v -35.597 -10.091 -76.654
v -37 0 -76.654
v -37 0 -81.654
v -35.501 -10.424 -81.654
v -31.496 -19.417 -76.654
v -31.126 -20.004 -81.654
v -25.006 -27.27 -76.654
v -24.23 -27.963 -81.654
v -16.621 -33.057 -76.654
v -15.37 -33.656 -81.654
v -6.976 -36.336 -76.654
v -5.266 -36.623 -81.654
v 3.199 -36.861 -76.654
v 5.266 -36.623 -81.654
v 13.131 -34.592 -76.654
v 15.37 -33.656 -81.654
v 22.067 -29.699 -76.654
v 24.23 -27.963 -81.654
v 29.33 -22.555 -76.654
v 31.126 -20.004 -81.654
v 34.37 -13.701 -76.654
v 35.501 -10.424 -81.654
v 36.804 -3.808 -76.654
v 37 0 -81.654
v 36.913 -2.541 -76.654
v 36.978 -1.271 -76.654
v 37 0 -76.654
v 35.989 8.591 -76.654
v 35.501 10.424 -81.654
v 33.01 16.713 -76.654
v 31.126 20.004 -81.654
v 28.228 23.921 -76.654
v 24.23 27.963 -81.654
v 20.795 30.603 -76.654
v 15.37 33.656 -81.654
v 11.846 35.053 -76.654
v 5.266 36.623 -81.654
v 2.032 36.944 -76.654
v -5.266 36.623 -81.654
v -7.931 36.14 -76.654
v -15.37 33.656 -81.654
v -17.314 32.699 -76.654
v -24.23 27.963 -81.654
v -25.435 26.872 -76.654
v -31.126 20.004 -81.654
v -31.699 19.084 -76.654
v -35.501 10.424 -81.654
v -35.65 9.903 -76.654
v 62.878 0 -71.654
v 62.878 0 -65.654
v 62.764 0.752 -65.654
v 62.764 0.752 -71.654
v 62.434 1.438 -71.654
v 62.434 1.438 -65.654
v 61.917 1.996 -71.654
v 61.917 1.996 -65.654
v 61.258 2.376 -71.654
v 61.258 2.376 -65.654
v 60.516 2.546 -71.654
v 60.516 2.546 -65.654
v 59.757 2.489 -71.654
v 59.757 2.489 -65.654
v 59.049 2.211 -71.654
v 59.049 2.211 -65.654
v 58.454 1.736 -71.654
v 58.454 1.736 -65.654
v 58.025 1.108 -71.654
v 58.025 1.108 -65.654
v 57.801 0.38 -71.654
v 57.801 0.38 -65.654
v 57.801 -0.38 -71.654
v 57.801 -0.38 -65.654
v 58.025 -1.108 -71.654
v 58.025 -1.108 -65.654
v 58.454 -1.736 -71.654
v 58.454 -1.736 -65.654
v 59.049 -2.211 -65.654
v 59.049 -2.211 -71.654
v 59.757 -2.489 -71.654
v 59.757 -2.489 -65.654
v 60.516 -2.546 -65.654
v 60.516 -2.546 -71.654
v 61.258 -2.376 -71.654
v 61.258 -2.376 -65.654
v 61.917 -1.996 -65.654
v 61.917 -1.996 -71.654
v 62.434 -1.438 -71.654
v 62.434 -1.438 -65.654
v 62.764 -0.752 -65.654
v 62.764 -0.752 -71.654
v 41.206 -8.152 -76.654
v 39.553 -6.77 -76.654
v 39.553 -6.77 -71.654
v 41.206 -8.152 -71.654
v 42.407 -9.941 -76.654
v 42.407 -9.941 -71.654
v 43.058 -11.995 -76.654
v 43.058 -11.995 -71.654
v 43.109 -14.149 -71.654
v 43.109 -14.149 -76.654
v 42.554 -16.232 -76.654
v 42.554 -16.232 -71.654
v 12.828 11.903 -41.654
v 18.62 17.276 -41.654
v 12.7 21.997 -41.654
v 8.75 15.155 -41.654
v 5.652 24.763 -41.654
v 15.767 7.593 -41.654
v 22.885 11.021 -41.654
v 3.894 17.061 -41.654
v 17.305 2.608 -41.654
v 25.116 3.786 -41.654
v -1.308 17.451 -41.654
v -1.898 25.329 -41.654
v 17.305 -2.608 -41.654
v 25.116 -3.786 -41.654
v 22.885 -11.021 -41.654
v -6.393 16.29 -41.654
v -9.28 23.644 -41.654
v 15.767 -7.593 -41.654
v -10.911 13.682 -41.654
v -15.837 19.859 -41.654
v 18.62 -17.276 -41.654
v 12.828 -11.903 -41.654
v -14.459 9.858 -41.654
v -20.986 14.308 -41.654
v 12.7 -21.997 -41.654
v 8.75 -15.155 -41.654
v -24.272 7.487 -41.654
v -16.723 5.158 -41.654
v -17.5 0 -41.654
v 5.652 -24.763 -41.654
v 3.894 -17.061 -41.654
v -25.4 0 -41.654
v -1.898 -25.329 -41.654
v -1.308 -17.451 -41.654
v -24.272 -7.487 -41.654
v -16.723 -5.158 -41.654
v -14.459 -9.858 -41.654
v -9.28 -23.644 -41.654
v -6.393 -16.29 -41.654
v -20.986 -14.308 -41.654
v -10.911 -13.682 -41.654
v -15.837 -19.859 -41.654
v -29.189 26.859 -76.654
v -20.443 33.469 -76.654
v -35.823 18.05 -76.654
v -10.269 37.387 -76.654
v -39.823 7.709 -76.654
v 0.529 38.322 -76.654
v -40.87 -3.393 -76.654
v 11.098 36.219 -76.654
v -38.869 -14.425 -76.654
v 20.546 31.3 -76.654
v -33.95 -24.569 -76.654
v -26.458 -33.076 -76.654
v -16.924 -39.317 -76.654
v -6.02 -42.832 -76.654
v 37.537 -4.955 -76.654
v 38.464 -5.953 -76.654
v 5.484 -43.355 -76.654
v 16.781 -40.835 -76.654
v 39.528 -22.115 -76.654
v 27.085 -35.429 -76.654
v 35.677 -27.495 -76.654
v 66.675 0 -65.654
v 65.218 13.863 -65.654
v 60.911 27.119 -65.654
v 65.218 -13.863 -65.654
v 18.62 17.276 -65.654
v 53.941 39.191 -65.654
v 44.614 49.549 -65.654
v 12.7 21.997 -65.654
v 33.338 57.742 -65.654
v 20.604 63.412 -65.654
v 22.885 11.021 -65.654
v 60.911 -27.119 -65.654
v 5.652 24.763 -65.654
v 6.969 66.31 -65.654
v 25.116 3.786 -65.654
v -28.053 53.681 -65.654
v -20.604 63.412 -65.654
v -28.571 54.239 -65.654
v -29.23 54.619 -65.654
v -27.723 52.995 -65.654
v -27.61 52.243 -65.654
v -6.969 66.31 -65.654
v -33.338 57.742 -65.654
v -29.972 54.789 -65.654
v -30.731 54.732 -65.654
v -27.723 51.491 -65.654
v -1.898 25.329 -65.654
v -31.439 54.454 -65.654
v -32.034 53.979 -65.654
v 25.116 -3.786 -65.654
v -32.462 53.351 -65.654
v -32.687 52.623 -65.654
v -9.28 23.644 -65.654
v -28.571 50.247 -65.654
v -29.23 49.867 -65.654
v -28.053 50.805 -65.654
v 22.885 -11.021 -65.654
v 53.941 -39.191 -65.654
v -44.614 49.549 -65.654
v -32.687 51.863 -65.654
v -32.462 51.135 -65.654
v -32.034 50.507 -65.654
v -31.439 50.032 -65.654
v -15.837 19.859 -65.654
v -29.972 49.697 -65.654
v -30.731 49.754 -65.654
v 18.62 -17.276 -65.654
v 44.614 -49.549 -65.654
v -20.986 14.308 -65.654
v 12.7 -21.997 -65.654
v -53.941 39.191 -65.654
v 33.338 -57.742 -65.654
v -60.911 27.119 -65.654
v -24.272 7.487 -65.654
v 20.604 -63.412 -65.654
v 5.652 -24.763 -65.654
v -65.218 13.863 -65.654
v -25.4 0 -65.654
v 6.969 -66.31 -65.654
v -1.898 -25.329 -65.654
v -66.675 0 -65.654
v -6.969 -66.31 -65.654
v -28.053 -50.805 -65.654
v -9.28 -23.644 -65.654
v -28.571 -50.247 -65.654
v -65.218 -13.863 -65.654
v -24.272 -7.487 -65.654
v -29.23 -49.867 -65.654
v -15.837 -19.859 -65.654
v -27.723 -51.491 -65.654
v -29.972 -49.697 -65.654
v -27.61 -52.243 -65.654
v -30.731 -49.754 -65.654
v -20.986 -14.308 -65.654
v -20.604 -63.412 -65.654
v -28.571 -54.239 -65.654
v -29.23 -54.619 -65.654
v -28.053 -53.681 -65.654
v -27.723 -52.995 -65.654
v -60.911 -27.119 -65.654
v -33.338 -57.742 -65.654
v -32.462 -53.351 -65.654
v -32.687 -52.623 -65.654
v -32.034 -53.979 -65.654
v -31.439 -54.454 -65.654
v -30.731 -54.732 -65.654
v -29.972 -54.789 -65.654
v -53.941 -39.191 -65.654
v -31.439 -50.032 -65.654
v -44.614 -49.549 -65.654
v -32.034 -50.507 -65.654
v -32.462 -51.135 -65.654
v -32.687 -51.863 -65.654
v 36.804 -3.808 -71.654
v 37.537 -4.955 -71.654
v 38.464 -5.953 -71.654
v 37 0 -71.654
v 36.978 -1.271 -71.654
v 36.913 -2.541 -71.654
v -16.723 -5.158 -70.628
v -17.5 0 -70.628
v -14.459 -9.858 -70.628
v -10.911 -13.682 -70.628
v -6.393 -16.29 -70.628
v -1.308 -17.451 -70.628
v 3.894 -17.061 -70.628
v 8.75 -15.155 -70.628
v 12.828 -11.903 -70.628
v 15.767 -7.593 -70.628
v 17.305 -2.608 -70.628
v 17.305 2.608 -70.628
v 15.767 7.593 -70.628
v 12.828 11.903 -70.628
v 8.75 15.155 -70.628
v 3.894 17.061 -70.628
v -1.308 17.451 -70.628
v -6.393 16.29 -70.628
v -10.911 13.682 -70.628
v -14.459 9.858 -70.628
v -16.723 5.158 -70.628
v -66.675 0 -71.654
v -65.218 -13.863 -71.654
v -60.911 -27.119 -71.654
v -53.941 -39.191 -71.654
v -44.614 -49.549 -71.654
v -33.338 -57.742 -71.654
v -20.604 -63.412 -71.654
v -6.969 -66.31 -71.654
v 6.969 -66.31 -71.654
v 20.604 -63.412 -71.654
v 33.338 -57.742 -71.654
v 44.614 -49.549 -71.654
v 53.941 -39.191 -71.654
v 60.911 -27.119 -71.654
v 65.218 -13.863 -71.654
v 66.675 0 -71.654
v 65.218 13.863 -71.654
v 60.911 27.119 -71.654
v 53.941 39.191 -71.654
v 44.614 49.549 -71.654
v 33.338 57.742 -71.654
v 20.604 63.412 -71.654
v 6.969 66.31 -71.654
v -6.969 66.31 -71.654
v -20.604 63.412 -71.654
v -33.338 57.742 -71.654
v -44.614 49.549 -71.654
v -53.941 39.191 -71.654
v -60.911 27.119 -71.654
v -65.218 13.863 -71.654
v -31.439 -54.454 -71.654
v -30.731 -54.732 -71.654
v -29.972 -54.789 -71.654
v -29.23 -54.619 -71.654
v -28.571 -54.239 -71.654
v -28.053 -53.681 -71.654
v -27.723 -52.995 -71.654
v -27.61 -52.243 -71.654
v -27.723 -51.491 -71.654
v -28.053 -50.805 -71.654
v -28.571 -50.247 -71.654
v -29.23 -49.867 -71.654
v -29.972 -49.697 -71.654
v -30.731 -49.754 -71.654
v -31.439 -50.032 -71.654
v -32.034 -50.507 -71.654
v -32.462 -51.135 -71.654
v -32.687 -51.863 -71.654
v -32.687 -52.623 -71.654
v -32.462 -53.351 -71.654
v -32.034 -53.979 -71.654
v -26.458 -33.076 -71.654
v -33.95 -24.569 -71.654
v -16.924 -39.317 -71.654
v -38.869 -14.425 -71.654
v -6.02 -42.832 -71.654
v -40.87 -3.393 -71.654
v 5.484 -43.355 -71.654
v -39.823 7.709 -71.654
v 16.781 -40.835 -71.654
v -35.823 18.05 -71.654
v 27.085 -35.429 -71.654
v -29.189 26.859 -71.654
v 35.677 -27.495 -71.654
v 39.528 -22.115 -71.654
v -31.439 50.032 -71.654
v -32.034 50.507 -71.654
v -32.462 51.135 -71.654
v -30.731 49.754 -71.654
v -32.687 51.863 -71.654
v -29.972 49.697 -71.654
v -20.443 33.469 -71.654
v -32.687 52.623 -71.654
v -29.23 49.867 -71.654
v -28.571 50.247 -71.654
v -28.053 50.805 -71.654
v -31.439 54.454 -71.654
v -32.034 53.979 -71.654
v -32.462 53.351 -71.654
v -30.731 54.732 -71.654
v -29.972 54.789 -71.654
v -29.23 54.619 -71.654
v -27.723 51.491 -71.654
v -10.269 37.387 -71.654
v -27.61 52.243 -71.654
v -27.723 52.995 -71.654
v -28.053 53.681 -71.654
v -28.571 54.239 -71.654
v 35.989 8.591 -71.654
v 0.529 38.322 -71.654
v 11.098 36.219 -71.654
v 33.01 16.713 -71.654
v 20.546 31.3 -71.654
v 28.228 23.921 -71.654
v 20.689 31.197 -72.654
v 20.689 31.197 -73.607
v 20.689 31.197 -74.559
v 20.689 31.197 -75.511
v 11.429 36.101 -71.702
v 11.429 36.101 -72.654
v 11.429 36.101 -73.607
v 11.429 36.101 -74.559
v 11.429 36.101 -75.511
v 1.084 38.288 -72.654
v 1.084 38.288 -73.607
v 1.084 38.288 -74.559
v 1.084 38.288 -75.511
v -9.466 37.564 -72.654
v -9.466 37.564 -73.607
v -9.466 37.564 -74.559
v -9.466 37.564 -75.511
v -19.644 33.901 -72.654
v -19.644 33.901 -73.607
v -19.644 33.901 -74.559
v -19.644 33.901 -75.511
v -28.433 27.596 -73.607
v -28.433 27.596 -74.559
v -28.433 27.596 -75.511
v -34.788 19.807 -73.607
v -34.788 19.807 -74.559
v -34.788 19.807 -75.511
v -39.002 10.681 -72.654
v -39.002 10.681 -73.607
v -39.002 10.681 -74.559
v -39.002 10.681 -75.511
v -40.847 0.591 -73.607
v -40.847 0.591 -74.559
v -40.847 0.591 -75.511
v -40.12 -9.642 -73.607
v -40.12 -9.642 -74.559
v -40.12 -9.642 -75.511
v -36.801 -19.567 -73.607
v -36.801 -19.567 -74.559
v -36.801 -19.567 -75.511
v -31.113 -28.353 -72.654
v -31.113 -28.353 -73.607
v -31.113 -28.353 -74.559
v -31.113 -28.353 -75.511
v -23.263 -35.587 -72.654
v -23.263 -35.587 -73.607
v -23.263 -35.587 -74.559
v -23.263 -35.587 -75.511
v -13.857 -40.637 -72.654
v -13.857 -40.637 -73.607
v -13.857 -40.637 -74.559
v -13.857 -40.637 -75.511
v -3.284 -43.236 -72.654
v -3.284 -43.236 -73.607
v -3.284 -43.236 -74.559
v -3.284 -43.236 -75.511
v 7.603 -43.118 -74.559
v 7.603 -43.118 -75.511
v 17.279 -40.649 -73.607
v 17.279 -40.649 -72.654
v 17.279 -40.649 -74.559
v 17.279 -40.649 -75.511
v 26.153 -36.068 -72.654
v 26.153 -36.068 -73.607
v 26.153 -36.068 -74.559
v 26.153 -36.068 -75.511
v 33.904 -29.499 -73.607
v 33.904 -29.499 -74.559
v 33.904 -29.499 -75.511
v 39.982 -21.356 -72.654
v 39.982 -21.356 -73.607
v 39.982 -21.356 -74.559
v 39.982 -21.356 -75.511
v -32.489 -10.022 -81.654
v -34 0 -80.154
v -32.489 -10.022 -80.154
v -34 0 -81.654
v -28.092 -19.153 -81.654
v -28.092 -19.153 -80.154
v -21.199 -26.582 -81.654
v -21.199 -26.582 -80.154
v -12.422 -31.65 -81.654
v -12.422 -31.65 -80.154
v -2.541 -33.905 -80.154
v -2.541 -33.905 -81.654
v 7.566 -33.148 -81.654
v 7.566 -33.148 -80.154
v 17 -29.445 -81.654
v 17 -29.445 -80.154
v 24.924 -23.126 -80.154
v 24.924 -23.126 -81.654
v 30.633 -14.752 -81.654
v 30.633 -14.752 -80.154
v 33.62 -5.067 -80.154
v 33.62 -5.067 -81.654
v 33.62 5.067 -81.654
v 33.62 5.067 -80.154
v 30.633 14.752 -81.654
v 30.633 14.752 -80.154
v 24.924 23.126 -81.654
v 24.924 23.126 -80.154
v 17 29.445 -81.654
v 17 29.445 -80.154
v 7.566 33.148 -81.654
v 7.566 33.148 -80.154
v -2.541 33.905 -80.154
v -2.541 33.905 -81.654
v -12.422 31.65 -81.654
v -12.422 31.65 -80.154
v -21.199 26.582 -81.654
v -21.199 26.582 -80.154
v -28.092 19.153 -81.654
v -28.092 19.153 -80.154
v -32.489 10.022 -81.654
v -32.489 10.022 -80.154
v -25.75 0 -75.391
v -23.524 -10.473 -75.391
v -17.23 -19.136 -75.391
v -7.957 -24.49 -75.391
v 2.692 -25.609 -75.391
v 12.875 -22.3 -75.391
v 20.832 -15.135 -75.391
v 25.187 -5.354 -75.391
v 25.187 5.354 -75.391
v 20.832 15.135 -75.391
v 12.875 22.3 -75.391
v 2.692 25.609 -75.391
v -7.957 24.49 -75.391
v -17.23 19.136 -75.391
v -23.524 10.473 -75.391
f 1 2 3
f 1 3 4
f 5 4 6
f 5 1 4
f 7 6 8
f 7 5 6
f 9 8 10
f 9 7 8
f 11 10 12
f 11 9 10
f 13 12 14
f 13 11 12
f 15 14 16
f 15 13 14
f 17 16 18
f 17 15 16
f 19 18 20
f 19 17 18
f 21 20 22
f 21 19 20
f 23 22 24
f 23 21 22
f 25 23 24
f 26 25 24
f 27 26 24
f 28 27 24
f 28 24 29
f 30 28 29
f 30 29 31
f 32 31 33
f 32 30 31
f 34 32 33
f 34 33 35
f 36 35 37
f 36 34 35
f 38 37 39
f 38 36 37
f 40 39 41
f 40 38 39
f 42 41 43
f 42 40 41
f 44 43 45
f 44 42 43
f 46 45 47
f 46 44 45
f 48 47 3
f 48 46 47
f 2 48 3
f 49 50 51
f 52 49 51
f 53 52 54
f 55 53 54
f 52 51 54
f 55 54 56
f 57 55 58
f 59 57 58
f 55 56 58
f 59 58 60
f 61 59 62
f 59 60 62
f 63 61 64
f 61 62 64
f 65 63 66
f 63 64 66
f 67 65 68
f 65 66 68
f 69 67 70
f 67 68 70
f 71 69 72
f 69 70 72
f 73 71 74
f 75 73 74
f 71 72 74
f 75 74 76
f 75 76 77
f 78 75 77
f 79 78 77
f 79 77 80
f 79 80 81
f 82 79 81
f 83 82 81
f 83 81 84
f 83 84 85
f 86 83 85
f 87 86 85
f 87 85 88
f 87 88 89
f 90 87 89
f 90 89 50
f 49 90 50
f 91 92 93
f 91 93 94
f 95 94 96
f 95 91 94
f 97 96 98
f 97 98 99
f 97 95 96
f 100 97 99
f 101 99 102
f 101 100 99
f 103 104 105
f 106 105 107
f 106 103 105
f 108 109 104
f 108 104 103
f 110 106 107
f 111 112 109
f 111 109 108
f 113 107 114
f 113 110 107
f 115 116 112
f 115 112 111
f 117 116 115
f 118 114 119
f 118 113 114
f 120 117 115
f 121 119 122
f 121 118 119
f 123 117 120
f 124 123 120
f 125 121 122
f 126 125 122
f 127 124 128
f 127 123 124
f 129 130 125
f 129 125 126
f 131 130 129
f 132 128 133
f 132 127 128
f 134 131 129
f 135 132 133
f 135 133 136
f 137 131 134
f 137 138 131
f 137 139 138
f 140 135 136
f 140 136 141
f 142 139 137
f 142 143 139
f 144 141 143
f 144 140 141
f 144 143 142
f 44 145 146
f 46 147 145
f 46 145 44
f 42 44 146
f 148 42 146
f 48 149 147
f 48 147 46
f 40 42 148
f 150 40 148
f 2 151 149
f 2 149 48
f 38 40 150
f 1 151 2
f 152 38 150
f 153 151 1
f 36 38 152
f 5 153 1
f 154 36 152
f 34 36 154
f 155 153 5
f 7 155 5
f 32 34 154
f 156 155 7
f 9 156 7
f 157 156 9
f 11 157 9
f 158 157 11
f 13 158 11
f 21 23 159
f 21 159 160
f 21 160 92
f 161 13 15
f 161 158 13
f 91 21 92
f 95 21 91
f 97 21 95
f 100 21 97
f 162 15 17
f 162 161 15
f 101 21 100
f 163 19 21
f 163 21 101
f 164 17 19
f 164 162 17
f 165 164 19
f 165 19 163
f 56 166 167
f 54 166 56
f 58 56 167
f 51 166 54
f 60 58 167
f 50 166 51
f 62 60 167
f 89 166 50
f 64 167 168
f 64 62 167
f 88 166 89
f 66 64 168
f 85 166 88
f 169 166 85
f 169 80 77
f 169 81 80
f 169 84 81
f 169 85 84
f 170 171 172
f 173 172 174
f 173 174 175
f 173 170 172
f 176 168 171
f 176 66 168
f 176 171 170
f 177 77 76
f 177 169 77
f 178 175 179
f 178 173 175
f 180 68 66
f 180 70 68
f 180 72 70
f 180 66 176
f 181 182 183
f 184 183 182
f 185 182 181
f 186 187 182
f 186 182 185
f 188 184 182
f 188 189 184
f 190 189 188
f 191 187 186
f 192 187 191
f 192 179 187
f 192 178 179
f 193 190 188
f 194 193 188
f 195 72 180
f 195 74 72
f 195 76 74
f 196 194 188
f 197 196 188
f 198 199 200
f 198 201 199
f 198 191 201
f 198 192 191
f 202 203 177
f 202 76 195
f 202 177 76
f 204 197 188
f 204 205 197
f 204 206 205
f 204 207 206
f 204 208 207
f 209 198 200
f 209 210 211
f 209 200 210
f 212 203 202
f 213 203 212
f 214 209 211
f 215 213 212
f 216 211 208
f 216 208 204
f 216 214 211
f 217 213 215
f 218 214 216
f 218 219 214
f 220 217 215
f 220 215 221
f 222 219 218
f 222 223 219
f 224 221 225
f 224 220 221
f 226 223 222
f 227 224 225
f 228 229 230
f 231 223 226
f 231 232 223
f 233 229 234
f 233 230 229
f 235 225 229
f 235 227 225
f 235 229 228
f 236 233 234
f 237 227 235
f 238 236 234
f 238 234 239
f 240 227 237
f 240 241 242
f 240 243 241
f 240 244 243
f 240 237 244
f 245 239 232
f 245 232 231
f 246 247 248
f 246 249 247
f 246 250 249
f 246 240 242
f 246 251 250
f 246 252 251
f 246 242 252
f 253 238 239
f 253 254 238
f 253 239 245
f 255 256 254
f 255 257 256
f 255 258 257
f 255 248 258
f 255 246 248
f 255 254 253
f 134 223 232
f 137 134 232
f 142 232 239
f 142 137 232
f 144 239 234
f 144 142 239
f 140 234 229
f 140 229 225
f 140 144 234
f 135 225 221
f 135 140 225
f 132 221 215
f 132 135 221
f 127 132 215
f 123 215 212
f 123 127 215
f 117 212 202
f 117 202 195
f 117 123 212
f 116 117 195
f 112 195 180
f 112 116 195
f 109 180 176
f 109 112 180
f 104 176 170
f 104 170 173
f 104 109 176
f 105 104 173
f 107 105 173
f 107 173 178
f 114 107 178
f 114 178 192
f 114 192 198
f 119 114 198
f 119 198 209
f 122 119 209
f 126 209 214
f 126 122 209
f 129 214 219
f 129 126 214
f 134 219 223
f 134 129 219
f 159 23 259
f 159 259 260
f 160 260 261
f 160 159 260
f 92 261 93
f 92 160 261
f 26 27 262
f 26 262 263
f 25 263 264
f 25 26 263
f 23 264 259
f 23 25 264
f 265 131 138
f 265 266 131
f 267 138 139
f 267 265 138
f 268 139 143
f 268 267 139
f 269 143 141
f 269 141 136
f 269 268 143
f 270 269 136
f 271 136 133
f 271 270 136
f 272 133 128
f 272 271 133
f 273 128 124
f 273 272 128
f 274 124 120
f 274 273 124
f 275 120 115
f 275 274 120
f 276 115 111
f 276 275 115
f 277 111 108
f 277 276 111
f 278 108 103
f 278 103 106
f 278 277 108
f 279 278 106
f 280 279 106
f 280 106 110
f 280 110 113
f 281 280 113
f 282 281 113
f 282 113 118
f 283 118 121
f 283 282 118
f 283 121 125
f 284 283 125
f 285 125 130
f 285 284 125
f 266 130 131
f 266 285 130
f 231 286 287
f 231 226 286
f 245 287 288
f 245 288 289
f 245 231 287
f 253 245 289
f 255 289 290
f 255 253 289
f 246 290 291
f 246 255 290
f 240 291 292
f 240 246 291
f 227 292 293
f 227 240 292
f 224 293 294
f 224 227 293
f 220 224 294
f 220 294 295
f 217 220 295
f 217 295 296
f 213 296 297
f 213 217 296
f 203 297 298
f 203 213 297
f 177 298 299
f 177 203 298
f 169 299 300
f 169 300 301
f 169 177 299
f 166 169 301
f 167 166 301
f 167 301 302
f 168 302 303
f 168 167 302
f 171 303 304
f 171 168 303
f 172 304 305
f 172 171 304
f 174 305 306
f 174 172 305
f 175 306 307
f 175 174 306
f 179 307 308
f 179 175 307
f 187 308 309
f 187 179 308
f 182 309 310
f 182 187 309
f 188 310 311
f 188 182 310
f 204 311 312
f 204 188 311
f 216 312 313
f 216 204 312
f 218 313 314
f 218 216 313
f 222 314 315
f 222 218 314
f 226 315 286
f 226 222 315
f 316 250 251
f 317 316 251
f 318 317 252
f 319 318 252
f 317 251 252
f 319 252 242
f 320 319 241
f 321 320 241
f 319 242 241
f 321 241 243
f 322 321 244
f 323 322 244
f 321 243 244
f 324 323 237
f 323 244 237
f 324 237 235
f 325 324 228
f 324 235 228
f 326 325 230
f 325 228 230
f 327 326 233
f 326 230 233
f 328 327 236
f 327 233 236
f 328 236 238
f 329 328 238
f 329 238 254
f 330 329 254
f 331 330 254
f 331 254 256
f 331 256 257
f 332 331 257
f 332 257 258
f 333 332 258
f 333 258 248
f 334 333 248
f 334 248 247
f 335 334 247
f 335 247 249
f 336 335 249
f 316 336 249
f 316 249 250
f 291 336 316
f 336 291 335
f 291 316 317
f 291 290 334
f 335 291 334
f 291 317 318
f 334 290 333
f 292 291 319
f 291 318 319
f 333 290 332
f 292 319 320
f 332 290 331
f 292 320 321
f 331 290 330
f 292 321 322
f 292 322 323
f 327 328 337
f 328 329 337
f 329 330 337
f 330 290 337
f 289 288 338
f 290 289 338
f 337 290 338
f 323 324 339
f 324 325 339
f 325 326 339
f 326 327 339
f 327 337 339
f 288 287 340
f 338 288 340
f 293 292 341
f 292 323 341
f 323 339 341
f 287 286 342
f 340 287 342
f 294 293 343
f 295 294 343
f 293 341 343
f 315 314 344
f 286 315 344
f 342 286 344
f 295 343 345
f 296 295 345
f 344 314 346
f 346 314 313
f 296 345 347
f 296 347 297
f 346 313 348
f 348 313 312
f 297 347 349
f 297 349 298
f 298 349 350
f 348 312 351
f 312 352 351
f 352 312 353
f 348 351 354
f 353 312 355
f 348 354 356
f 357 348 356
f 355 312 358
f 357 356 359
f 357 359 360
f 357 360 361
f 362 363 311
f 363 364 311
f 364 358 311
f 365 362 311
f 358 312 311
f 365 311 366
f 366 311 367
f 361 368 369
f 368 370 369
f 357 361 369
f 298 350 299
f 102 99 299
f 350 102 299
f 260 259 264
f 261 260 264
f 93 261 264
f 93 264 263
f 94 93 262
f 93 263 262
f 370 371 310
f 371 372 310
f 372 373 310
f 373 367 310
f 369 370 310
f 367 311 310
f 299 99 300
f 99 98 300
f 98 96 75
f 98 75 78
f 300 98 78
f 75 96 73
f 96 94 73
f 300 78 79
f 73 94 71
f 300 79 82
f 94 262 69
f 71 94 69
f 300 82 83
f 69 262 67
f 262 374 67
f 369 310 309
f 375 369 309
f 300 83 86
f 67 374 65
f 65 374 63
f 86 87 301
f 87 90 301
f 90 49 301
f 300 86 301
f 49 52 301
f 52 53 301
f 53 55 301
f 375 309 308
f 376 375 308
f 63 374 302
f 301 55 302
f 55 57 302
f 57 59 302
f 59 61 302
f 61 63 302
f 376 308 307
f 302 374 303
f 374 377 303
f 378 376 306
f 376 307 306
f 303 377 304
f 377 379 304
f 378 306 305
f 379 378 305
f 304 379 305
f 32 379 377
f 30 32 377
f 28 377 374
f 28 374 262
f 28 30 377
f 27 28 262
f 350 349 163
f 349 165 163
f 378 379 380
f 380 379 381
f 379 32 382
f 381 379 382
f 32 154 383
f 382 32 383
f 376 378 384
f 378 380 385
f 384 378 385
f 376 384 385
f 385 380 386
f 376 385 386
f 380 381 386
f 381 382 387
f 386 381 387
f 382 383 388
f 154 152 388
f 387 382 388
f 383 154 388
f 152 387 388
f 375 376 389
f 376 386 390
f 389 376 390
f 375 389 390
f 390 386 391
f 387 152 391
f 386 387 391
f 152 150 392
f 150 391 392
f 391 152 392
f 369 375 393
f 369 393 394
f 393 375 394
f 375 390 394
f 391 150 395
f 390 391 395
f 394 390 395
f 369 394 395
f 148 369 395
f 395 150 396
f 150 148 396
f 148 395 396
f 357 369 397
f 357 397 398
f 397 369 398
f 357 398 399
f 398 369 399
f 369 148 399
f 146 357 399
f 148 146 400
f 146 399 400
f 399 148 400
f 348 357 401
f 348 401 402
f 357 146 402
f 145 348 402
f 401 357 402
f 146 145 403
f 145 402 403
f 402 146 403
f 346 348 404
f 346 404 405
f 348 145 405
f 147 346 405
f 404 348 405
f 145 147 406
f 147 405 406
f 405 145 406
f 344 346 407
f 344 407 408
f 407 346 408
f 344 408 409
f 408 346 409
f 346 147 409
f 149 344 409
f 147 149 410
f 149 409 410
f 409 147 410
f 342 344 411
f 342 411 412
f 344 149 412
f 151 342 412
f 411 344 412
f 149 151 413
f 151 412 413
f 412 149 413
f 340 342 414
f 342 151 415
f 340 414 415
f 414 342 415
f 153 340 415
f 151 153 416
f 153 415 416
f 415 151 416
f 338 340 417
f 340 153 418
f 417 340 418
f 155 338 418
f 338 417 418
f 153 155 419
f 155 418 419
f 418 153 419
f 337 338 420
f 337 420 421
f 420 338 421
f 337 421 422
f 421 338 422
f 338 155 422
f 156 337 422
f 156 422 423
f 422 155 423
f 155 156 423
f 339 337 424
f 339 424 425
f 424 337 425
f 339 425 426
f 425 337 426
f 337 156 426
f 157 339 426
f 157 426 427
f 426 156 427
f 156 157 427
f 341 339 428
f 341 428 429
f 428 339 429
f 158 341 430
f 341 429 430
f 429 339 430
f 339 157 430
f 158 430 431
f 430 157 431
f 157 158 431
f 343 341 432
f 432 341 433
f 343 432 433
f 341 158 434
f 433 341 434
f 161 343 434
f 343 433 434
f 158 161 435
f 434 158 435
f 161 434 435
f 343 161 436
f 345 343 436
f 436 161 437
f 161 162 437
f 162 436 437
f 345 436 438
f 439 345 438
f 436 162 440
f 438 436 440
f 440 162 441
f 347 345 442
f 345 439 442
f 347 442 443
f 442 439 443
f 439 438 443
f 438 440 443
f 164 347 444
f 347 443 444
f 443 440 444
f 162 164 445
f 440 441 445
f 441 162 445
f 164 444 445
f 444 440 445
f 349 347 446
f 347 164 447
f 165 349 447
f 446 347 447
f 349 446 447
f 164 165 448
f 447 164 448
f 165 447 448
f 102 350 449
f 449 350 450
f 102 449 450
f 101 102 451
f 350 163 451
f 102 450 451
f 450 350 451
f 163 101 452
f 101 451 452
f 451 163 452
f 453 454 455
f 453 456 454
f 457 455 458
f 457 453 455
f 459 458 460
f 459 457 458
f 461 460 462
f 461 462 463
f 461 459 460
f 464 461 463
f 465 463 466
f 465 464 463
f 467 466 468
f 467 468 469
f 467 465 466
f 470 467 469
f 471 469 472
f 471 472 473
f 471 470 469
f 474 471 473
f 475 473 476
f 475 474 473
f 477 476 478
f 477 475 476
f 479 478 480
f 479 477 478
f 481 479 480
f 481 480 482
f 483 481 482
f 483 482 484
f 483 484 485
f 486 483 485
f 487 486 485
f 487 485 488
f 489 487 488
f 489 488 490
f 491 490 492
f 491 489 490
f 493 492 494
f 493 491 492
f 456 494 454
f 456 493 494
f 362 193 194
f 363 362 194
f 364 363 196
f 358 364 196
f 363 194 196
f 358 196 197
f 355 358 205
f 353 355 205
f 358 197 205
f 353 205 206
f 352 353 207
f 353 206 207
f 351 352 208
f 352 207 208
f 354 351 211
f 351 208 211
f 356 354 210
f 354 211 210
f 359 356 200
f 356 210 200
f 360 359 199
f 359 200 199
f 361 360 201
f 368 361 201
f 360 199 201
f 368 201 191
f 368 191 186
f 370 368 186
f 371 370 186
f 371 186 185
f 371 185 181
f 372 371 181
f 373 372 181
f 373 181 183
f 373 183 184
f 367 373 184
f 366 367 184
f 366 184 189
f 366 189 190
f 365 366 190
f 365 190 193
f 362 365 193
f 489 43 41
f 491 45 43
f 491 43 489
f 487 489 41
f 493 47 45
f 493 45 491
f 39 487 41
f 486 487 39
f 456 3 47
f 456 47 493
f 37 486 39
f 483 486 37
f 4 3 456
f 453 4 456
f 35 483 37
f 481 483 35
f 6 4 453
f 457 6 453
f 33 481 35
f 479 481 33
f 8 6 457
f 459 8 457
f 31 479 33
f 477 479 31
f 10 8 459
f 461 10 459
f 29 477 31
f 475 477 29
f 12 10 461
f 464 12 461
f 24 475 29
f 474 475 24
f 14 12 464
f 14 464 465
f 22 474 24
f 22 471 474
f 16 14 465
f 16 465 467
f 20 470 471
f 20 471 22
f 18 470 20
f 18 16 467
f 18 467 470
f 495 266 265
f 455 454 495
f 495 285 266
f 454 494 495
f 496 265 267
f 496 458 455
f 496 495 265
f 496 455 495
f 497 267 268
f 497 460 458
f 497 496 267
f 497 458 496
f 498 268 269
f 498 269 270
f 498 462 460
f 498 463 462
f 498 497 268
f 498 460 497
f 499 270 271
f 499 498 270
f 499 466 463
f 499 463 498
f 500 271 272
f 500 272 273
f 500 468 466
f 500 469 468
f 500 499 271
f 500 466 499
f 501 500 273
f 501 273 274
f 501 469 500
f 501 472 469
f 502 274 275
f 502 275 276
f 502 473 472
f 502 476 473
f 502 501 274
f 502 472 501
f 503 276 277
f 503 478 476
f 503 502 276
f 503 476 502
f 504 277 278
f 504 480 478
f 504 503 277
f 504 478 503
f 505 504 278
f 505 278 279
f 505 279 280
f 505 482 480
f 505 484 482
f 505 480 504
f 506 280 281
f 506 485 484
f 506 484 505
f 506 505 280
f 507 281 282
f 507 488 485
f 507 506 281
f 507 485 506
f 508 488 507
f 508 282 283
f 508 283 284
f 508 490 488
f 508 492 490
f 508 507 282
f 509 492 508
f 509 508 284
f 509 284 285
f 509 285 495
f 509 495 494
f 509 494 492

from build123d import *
from build123d.topology import SkipClean

# Parameters (mm, degrees)
SKETCH18_R             = 47.625
CUT_EXTRUDE2_DEPTH     = 5
F_10_CLEARANCE_HOLE1_D = 5.1054
CIRPATTERN1_COUNT      = 3


with BuildPart() as part:
    # Sketch24 → Revolve1 (revolve)
    with BuildSketch(Plane(origin=(0, 0, 0), x_dir=(1, 0, 0), z_dir=(0, 1, 0))):
        Polygon((-37, 81.654237034), (-37, 76.654237034), (-47.625, 76.654237034), (-47.625, 71.654237034), (-66.675, 71.654237034), (-66.675, 65.654237034), (-25.4, 65.654237034), (-25.4, 41.654237034), (-17.5, 41.654237034), (-17.5, 70.627957592), (-34, 80.154237034), (-34, 81.654237034), align=None)
    revolve(axis=Axis((0, 0, -86.654237034), (0, 0, 1)))

    # Sketch18 → Cut-Extrude2 (cut)
    with SkipClean():  # the faces are left unmerged after this step: merging them gives an invalid solid
        with BuildSketch(Plane.XY.offset(-76.654237034)):
            Circle(SKETCH18_R)
            with BuildLine():
                ThreePointArc((36.803517411, -3.8080318), (37.978132396, -5.474504313), (39.552581276, -6.769865934))
                ThreePointArc((39.552581276, -6.769865934), (42.805320101, -10.94498561), (42.554027377, -16.231646763))
                add(Edge.make_bspline(
                    [(28.227591738, 23.920766389), (28.169074611, 23.995894132), (27.726201544, 24.559979405), (26.867938753, 25.590107465), (25.60001603, 26.964989265), (24.261773335, 28.277085961), (22.856314773, 29.522798851), (21.386929147, 30.698682629), (19.85708232, 31.801454876), (18.270409111, 32.828005175), (16.630704717, 33.775403815), (14.941915703, 34.640910073), (13.208130556, 35.421980041), (11.43356985, 36.116273987), (9.622576022, 36.721663214), (7.779602801, 37.236236415), (5.909204301, 37.658305492), (4.016023818, 37.986410831), (2.104782347, 38.219326014), (0.180266852, 38.356061949), (-1.75268168, 38.395870413), (-3.689180377, 38.338246992), (-5.624316777, 38.182933409), (-7.553161251, 37.929919231), (-9.470779522, 37.579442948), (-11.37224525, 37.131992419), (-13.252652651, 36.588304682), (-15.107129112, 35.949365124), (-16.930847778, 35.216406011), (-18.719040078, 34.390904381), (-20.467008144, 33.474579298), (-22.170137115, 32.469388481), (-23.823907266, 31.377524301), (-25.42390596, 30.201409162), (-26.965839357, 28.943690275), (-28.445543888, 27.607233836), (-29.858997424, 26.195118613), (-31.202330147, 24.710628968), (-32.471835063, 23.157247319), (-33.663978152, 21.538646066), (-34.775408104, 19.858679), (-35.802965645, 18.121372202), (-36.743692396, 16.330914471), (-37.594839261, 14.491647299), (-38.353874308, 12.608054401), (-39.018490139, 10.68475085), (-39.586610697, 8.726471825), (-40.056397525, 6.738061006), (-40.426255434, 4.724458642), (-40.694837576, 2.690689328), (-40.861049894, 0.641849508), (-40.924054953, -1.416905249), (-40.883275123, -3.480373184), (-40.738395114, -5.543319447), (-40.489363842, -7.600489337), (-40.13639564, -9.646621653), (-39.679970776, -11.676462103), (-39.120835312, -13.684776759), (-38.460000265, -15.666365517), (-37.698740094, -17.61607551), (-36.838590511, -19.528814477), (-35.881345602, -21.399564006), (-34.829054288, -23.223392663), (-33.684016107, -24.995468936), (-32.44877635, -26.711073982), (-31.126120537, -28.365614138), (-29.719068263, -29.954633155), (-28.230866416, -31.473824138), (-26.664981791, -32.919041144), (-25.025093105, -34.286310417), (-23.315082441, -35.571841228), (-21.53902614, -36.772036288), (-19.701185153, -37.883501708), (-17.805994889, -38.903056478), (-15.85805457, -39.827741435), (-13.862116128, -40.654827709), (-11.823072667, -41.381824596), (-9.745946518, -42.006486871), (-7.635876912, -42.526821485), (-5.498107312, -42.941093656), (-3.337972426, -43.247832311), (-1.160884928, -43.445834888), (1.027678058, -43.534171454), (3.222188708, -43.512188152), (5.417082419, -43.379509955), (7.606771886, -43.136042707), (9.785661288, -42.781974466), (11.948160555, -42.317776118), (14.08869967, -41.74420128), (16.201742982, -41.062285471), (18.281803484, -40.273344558), (20.323457017, -39.378972487), (22.321356376, -38.381038284), (24.27024527, -37.281682345), (26.164972102, -36.083312015), (28.000503535, -34.788596469), (29.77193781, -33.400460899), (31.474517775, -31.92208003), (33.103643596, -30.356870964), (34.654885111, -28.708485383), (36.123993806, -26.980801118), (37.506914359, -25.17791311), (38.799795742, -23.304123775), (39.999001844, -21.363932809), (41.101121576, -19.362026441), (41.938186302, -17.641904891), (42.402189205, -16.588613759), (42.554027377, -16.231646763)],
                    knots=[0.099688645, 0.099688645, 0.099688645, 0.099688645, 0.100798534, 0.108047194, 0.115310927, 0.122589766, 0.12988374, 0.13719288, 0.144517215, 0.151856774, 0.159211583, 0.16658167, 0.173967063, 0.181367786, 0.188783866, 0.196215328, 0.203662198, 0.211124498, 0.218602253, 0.226095488, 0.233604225, 0.241128486, 0.248668296, 0.256223676, 0.263794648, 0.271381234, 0.278983456, 0.286601335, 0.294234891, 0.301884146, 0.309549121, 0.317229835, 0.324926308, 0.332638561, 0.340366614, 0.348110485, 0.355870195, 0.363645762, 0.371437205, 0.379244543, 0.387067795, 0.39490698, 0.402762115, 0.410633219, 0.41852031, 0.426423405, 0.434342523, 0.442277682, 0.450228898, 0.458196189, 0.466179572, 0.474179065, 0.482194684, 0.490226447, 0.498274369, 0.506338468, 0.514418761, 0.522515263, 0.530627991, 0.538756962, 0.546902191, 0.555063694, 0.563241488, 0.571435588, 0.57964601, 0.58787277, 0.596115883, 0.604375364, 0.61265123, 0.620943495, 0.629252175, 0.637577285, 0.64591884, 0.654276855, 0.662651345, 0.671042324, 0.679449808, 0.687873812, 0.696314349, 0.704771435, 0.713245083, 0.721735309, 0.730242127, 0.738765551, 0.747305595, 0.755862273, 0.7644356, 0.77302559, 0.781632256, 0.790255613, 0.798895674, 0.807552454, 0.816225965, 0.824916222, 0.833623239, 0.842347028, 0.851087604, 0.859844979, 0.868619169, 0.877410184, 0.88621804, 0.895042749, 0.903884325, 0.912742781, 0.921618129, 0.930510383, 0.935031581, 0.935031581, 0.935031581, 0.935031581], degree=3))
                ThreePointArc((28.227591738, 23.920766389), (34.737738084, 12.739291693), (37, 0))
                ThreePointArc((37, 0), (36.950846703, -1.906548688), (36.803517411, -3.8080318))
            make_face(mode=Mode.SUBTRACT)
        extrude(amount=CUT_EXTRUDE2_DEPTH, mode=Mode.SUBTRACT)

    # #10 Clearance Hole1 (through all)
    with Locations(Plane(origin=(60.325, 0, -71.654237034), x_dir=(-1, 0, 0), z_dir=(0, 0, -1))):
        with Locations((0, 0)):
            f_10_clearance_hole1 = Hole(F_10_CLEARANCE_HOLE1_D / 2)

    # CirPattern1: #10 Clearance Hole1 ×3 about axis
    with SkipClean():  # the faces are left unmerged after this step: merging them gives an invalid solid
        cirpattern1_axis = Axis((0, 0, 0), (0, 0, 1))
        for i in range(1, CIRPATTERN1_COUNT):
            add(f_10_clearance_hole1.rotate(cirpattern1_axis, i * 360 / CIRPATTERN1_COUNT), mode=Mode.SUBTRACT)


solid = part.part
